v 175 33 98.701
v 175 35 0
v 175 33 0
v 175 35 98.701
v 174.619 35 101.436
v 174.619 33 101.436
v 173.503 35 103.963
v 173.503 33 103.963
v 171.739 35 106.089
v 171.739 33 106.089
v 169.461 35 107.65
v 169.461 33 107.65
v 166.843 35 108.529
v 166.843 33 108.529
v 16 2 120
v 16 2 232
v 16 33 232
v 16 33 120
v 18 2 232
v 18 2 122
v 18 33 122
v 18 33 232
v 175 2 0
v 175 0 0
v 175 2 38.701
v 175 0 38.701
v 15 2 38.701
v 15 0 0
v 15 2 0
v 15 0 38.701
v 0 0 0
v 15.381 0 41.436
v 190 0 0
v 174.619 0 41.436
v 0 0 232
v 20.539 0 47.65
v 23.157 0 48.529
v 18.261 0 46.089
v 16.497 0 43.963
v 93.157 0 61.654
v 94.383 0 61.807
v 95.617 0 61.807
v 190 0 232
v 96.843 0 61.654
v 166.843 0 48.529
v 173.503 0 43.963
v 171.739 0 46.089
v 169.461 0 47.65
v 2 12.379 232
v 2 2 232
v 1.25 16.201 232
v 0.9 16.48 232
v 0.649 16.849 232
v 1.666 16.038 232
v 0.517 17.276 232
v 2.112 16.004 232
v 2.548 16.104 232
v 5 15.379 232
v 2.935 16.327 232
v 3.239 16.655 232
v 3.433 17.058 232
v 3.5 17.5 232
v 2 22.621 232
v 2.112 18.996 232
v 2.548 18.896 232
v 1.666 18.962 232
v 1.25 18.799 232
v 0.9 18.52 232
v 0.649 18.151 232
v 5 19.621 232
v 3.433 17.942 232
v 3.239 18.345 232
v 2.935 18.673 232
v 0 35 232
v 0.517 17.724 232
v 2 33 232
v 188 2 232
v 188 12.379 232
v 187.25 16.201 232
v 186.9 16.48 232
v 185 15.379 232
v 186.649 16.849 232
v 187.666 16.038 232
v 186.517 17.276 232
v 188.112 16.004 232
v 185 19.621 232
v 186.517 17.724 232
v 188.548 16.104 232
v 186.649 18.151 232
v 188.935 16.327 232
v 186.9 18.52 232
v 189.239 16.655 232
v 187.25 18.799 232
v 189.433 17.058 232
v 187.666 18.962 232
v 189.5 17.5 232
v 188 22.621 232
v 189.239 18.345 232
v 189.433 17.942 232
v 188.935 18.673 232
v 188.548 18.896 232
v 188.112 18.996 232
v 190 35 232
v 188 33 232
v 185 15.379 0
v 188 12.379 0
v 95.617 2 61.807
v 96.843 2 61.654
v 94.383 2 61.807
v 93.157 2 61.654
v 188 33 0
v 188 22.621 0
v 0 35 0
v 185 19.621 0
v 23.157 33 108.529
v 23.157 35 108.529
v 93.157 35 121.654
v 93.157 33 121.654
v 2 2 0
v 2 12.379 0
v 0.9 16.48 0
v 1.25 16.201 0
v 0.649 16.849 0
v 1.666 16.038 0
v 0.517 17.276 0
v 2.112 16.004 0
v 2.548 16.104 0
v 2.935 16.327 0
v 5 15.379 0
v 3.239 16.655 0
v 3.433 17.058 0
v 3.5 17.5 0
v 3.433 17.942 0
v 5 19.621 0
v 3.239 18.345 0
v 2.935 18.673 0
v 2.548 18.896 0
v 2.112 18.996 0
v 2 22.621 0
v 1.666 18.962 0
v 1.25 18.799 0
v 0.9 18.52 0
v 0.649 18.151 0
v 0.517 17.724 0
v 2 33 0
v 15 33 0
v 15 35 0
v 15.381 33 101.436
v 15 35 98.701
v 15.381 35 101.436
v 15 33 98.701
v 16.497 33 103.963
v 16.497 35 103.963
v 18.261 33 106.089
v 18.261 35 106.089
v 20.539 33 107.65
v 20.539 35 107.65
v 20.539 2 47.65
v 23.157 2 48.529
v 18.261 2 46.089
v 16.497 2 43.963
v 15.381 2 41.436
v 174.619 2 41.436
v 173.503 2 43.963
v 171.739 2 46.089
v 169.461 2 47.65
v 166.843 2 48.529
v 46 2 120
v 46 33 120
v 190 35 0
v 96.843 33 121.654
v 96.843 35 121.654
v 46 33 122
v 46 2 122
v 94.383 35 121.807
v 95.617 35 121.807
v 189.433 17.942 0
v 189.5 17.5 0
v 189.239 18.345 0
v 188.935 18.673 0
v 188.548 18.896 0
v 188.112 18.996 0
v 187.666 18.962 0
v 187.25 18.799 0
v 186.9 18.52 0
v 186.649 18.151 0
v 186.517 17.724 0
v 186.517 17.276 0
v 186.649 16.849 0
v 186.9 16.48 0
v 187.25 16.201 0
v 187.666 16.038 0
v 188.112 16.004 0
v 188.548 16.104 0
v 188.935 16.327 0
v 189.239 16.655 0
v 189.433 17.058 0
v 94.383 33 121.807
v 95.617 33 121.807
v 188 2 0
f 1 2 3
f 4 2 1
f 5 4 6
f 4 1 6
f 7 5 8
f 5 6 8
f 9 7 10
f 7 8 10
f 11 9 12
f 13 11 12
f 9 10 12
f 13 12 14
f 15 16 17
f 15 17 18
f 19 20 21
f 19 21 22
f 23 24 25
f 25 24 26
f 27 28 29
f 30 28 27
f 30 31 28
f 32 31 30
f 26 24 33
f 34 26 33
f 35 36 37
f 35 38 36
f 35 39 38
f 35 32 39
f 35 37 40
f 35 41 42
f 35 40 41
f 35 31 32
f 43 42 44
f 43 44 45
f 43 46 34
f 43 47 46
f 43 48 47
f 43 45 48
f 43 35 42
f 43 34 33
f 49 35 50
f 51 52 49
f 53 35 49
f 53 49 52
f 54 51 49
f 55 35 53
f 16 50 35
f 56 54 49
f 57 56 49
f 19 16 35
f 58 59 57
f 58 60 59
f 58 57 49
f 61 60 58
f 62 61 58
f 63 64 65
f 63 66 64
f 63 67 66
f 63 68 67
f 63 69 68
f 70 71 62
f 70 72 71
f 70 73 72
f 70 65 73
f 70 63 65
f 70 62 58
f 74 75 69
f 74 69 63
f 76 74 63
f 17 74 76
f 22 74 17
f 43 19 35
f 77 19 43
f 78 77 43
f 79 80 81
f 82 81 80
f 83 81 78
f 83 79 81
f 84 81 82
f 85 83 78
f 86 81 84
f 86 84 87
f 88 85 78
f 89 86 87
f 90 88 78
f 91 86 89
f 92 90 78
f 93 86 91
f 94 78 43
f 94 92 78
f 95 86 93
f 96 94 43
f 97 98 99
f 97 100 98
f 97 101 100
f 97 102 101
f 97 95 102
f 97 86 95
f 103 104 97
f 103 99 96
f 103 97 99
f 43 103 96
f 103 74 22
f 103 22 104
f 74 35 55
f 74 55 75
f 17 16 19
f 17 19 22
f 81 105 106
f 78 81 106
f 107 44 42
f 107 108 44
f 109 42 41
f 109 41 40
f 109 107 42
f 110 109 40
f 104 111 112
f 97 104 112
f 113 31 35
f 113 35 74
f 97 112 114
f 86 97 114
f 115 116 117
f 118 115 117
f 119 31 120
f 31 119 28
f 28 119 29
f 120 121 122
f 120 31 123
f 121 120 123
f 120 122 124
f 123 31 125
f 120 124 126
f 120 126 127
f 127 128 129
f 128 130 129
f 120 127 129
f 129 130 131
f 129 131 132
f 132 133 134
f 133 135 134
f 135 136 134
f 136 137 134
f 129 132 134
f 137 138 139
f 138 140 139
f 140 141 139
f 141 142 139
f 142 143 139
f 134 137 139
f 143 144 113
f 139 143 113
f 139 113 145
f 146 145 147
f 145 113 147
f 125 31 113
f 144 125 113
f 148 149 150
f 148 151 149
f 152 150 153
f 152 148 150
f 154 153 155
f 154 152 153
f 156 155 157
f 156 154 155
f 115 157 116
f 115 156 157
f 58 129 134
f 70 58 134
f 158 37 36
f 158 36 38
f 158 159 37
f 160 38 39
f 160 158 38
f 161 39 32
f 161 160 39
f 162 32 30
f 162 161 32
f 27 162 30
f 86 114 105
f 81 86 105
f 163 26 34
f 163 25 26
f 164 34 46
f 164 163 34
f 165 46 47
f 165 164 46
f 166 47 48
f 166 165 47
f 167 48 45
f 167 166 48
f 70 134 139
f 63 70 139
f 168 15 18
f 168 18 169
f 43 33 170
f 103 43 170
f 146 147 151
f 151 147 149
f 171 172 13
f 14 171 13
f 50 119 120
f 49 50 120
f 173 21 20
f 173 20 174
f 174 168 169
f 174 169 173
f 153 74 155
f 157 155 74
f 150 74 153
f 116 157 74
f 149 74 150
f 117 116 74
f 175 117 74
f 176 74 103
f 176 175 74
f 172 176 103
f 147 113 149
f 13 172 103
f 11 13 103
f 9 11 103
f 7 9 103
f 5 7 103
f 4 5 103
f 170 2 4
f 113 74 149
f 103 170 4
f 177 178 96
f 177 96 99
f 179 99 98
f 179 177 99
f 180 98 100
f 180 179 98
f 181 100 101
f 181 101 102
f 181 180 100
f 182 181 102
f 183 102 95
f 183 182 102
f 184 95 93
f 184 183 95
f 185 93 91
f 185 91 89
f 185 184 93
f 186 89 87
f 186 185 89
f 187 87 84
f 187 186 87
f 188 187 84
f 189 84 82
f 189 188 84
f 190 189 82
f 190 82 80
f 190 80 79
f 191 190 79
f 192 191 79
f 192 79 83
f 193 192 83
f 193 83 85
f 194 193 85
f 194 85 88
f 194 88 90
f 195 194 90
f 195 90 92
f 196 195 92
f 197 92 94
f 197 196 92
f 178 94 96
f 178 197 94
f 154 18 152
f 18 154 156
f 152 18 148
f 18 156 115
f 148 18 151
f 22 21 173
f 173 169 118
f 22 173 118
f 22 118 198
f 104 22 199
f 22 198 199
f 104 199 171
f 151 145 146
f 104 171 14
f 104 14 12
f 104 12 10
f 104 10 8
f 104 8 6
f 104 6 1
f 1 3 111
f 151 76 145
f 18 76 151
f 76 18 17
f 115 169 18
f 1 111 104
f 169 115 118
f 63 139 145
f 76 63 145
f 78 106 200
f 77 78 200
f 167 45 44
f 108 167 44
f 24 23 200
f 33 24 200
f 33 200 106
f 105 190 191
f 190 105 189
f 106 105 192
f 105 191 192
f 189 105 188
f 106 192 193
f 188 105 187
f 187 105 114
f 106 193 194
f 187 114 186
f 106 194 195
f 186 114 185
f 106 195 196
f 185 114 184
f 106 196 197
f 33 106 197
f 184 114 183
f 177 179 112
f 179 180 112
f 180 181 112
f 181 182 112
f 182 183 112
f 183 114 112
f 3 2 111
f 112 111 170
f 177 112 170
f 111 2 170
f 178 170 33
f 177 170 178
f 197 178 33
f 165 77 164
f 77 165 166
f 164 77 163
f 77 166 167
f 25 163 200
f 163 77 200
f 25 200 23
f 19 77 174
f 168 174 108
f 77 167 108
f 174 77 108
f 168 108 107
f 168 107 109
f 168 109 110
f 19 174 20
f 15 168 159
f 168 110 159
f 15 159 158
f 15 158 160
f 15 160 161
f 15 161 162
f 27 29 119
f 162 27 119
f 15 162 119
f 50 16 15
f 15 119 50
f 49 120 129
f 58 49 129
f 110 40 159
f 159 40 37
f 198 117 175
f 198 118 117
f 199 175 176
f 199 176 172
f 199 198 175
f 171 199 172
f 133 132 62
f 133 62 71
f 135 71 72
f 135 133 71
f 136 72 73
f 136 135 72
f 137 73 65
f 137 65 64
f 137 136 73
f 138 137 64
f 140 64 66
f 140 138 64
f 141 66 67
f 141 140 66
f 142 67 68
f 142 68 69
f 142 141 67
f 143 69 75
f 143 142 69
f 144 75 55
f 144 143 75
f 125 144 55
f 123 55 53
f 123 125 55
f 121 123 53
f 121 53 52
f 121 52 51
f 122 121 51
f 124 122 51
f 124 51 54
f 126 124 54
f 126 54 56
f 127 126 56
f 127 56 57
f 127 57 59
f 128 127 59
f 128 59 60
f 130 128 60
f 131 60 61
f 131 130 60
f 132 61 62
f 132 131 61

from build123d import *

# Parameters (mm, degrees)
F0_W     = 190
F0_H     = 35
F0_R     = 1.5
F1_DEPTH = 232
F2_W     = 2
F2_H     = 110
F2_H_2   = 2
F2_W_2   = 28
F3_DEPTH = 33
F4_W     = 160
F4_H     = 107
F5_DEPTH = 5
F6_W     = 160
F6_H     = 47
F7_DEPTH = 5
F8_R     = 10


with BuildPart() as f1:
    # F0 (on Top) → F1 (new body)
    with BuildSketch(Plane.XY):
        with Locations((95, 17.5)):
            Rectangle(F0_W, F0_H)
        with Locations((2, 17.5)):
            Circle(F0_R, mode=Mode.SUBTRACT)
        Polygon((188, 2), (2, 2), (2, 12.3786796564), (5, 15.3786796564), (5, 19.6213203436), (2, 22.6213203436), (2, 33), (188, 33), (188, 22.6213203436), (185, 19.6213203436), (185, 15.3786796564), (188, 12.3786796564), align=None, mode=Mode.SUBTRACT)
        with Locations((188, 17.5)):
            Circle(F0_R, mode=Mode.SUBTRACT)
    extrude(amount=F1_DEPTH)

    # F2 (on face) → F3 (join)
    with BuildSketch(Plane.XZ):
        with Locations((17, 177)):
            Rectangle(F2_W, F2_H)
        with Locations((17, 121)):
            Rectangle(F2_W, F2_H_2)
        with Locations((32, 121)):
            Rectangle(F2_W_2, F2_H_2)
    extrude(amount=-F3_DEPTH)

    # F4 (on face) → F5 (cut)
    with BuildSketch(Plane(origin=(0, 35, 0), x_dir=(-1, 0, 0), z_dir=(0, 1, 0))):
        with Locations((-95, 53.5)):
            Rectangle(F4_W, F4_H)
        Polygon((-175, 107), (-15, 107), (-95, 122), align=None)
    extrude(amount=-F5_DEPTH, mode=Mode.SUBTRACT)

    # F6 (on face) → F7 (cut)
    with BuildSketch(Plane.XZ):
        Polygon((95, 62), (15, 47), (175, 47), align=None)
        with Locations((95, 23.5)):
            Rectangle(F6_W, F6_H)
    extrude(amount=-F7_DEPTH, mode=Mode.SUBTRACT)

    # F8
    f8_edges = [f1.edges().sort_by_distance(p)[0] for p in [
        (175, 1, 47),
        (175, 34, 107),
        (15, 34, 107),
        (15, 1, 47),
        (95, 34, 122),
        (95, 1, 62),
    ]]
    fillet(f8_edges, radius=F8_R)


solid = f1.part
